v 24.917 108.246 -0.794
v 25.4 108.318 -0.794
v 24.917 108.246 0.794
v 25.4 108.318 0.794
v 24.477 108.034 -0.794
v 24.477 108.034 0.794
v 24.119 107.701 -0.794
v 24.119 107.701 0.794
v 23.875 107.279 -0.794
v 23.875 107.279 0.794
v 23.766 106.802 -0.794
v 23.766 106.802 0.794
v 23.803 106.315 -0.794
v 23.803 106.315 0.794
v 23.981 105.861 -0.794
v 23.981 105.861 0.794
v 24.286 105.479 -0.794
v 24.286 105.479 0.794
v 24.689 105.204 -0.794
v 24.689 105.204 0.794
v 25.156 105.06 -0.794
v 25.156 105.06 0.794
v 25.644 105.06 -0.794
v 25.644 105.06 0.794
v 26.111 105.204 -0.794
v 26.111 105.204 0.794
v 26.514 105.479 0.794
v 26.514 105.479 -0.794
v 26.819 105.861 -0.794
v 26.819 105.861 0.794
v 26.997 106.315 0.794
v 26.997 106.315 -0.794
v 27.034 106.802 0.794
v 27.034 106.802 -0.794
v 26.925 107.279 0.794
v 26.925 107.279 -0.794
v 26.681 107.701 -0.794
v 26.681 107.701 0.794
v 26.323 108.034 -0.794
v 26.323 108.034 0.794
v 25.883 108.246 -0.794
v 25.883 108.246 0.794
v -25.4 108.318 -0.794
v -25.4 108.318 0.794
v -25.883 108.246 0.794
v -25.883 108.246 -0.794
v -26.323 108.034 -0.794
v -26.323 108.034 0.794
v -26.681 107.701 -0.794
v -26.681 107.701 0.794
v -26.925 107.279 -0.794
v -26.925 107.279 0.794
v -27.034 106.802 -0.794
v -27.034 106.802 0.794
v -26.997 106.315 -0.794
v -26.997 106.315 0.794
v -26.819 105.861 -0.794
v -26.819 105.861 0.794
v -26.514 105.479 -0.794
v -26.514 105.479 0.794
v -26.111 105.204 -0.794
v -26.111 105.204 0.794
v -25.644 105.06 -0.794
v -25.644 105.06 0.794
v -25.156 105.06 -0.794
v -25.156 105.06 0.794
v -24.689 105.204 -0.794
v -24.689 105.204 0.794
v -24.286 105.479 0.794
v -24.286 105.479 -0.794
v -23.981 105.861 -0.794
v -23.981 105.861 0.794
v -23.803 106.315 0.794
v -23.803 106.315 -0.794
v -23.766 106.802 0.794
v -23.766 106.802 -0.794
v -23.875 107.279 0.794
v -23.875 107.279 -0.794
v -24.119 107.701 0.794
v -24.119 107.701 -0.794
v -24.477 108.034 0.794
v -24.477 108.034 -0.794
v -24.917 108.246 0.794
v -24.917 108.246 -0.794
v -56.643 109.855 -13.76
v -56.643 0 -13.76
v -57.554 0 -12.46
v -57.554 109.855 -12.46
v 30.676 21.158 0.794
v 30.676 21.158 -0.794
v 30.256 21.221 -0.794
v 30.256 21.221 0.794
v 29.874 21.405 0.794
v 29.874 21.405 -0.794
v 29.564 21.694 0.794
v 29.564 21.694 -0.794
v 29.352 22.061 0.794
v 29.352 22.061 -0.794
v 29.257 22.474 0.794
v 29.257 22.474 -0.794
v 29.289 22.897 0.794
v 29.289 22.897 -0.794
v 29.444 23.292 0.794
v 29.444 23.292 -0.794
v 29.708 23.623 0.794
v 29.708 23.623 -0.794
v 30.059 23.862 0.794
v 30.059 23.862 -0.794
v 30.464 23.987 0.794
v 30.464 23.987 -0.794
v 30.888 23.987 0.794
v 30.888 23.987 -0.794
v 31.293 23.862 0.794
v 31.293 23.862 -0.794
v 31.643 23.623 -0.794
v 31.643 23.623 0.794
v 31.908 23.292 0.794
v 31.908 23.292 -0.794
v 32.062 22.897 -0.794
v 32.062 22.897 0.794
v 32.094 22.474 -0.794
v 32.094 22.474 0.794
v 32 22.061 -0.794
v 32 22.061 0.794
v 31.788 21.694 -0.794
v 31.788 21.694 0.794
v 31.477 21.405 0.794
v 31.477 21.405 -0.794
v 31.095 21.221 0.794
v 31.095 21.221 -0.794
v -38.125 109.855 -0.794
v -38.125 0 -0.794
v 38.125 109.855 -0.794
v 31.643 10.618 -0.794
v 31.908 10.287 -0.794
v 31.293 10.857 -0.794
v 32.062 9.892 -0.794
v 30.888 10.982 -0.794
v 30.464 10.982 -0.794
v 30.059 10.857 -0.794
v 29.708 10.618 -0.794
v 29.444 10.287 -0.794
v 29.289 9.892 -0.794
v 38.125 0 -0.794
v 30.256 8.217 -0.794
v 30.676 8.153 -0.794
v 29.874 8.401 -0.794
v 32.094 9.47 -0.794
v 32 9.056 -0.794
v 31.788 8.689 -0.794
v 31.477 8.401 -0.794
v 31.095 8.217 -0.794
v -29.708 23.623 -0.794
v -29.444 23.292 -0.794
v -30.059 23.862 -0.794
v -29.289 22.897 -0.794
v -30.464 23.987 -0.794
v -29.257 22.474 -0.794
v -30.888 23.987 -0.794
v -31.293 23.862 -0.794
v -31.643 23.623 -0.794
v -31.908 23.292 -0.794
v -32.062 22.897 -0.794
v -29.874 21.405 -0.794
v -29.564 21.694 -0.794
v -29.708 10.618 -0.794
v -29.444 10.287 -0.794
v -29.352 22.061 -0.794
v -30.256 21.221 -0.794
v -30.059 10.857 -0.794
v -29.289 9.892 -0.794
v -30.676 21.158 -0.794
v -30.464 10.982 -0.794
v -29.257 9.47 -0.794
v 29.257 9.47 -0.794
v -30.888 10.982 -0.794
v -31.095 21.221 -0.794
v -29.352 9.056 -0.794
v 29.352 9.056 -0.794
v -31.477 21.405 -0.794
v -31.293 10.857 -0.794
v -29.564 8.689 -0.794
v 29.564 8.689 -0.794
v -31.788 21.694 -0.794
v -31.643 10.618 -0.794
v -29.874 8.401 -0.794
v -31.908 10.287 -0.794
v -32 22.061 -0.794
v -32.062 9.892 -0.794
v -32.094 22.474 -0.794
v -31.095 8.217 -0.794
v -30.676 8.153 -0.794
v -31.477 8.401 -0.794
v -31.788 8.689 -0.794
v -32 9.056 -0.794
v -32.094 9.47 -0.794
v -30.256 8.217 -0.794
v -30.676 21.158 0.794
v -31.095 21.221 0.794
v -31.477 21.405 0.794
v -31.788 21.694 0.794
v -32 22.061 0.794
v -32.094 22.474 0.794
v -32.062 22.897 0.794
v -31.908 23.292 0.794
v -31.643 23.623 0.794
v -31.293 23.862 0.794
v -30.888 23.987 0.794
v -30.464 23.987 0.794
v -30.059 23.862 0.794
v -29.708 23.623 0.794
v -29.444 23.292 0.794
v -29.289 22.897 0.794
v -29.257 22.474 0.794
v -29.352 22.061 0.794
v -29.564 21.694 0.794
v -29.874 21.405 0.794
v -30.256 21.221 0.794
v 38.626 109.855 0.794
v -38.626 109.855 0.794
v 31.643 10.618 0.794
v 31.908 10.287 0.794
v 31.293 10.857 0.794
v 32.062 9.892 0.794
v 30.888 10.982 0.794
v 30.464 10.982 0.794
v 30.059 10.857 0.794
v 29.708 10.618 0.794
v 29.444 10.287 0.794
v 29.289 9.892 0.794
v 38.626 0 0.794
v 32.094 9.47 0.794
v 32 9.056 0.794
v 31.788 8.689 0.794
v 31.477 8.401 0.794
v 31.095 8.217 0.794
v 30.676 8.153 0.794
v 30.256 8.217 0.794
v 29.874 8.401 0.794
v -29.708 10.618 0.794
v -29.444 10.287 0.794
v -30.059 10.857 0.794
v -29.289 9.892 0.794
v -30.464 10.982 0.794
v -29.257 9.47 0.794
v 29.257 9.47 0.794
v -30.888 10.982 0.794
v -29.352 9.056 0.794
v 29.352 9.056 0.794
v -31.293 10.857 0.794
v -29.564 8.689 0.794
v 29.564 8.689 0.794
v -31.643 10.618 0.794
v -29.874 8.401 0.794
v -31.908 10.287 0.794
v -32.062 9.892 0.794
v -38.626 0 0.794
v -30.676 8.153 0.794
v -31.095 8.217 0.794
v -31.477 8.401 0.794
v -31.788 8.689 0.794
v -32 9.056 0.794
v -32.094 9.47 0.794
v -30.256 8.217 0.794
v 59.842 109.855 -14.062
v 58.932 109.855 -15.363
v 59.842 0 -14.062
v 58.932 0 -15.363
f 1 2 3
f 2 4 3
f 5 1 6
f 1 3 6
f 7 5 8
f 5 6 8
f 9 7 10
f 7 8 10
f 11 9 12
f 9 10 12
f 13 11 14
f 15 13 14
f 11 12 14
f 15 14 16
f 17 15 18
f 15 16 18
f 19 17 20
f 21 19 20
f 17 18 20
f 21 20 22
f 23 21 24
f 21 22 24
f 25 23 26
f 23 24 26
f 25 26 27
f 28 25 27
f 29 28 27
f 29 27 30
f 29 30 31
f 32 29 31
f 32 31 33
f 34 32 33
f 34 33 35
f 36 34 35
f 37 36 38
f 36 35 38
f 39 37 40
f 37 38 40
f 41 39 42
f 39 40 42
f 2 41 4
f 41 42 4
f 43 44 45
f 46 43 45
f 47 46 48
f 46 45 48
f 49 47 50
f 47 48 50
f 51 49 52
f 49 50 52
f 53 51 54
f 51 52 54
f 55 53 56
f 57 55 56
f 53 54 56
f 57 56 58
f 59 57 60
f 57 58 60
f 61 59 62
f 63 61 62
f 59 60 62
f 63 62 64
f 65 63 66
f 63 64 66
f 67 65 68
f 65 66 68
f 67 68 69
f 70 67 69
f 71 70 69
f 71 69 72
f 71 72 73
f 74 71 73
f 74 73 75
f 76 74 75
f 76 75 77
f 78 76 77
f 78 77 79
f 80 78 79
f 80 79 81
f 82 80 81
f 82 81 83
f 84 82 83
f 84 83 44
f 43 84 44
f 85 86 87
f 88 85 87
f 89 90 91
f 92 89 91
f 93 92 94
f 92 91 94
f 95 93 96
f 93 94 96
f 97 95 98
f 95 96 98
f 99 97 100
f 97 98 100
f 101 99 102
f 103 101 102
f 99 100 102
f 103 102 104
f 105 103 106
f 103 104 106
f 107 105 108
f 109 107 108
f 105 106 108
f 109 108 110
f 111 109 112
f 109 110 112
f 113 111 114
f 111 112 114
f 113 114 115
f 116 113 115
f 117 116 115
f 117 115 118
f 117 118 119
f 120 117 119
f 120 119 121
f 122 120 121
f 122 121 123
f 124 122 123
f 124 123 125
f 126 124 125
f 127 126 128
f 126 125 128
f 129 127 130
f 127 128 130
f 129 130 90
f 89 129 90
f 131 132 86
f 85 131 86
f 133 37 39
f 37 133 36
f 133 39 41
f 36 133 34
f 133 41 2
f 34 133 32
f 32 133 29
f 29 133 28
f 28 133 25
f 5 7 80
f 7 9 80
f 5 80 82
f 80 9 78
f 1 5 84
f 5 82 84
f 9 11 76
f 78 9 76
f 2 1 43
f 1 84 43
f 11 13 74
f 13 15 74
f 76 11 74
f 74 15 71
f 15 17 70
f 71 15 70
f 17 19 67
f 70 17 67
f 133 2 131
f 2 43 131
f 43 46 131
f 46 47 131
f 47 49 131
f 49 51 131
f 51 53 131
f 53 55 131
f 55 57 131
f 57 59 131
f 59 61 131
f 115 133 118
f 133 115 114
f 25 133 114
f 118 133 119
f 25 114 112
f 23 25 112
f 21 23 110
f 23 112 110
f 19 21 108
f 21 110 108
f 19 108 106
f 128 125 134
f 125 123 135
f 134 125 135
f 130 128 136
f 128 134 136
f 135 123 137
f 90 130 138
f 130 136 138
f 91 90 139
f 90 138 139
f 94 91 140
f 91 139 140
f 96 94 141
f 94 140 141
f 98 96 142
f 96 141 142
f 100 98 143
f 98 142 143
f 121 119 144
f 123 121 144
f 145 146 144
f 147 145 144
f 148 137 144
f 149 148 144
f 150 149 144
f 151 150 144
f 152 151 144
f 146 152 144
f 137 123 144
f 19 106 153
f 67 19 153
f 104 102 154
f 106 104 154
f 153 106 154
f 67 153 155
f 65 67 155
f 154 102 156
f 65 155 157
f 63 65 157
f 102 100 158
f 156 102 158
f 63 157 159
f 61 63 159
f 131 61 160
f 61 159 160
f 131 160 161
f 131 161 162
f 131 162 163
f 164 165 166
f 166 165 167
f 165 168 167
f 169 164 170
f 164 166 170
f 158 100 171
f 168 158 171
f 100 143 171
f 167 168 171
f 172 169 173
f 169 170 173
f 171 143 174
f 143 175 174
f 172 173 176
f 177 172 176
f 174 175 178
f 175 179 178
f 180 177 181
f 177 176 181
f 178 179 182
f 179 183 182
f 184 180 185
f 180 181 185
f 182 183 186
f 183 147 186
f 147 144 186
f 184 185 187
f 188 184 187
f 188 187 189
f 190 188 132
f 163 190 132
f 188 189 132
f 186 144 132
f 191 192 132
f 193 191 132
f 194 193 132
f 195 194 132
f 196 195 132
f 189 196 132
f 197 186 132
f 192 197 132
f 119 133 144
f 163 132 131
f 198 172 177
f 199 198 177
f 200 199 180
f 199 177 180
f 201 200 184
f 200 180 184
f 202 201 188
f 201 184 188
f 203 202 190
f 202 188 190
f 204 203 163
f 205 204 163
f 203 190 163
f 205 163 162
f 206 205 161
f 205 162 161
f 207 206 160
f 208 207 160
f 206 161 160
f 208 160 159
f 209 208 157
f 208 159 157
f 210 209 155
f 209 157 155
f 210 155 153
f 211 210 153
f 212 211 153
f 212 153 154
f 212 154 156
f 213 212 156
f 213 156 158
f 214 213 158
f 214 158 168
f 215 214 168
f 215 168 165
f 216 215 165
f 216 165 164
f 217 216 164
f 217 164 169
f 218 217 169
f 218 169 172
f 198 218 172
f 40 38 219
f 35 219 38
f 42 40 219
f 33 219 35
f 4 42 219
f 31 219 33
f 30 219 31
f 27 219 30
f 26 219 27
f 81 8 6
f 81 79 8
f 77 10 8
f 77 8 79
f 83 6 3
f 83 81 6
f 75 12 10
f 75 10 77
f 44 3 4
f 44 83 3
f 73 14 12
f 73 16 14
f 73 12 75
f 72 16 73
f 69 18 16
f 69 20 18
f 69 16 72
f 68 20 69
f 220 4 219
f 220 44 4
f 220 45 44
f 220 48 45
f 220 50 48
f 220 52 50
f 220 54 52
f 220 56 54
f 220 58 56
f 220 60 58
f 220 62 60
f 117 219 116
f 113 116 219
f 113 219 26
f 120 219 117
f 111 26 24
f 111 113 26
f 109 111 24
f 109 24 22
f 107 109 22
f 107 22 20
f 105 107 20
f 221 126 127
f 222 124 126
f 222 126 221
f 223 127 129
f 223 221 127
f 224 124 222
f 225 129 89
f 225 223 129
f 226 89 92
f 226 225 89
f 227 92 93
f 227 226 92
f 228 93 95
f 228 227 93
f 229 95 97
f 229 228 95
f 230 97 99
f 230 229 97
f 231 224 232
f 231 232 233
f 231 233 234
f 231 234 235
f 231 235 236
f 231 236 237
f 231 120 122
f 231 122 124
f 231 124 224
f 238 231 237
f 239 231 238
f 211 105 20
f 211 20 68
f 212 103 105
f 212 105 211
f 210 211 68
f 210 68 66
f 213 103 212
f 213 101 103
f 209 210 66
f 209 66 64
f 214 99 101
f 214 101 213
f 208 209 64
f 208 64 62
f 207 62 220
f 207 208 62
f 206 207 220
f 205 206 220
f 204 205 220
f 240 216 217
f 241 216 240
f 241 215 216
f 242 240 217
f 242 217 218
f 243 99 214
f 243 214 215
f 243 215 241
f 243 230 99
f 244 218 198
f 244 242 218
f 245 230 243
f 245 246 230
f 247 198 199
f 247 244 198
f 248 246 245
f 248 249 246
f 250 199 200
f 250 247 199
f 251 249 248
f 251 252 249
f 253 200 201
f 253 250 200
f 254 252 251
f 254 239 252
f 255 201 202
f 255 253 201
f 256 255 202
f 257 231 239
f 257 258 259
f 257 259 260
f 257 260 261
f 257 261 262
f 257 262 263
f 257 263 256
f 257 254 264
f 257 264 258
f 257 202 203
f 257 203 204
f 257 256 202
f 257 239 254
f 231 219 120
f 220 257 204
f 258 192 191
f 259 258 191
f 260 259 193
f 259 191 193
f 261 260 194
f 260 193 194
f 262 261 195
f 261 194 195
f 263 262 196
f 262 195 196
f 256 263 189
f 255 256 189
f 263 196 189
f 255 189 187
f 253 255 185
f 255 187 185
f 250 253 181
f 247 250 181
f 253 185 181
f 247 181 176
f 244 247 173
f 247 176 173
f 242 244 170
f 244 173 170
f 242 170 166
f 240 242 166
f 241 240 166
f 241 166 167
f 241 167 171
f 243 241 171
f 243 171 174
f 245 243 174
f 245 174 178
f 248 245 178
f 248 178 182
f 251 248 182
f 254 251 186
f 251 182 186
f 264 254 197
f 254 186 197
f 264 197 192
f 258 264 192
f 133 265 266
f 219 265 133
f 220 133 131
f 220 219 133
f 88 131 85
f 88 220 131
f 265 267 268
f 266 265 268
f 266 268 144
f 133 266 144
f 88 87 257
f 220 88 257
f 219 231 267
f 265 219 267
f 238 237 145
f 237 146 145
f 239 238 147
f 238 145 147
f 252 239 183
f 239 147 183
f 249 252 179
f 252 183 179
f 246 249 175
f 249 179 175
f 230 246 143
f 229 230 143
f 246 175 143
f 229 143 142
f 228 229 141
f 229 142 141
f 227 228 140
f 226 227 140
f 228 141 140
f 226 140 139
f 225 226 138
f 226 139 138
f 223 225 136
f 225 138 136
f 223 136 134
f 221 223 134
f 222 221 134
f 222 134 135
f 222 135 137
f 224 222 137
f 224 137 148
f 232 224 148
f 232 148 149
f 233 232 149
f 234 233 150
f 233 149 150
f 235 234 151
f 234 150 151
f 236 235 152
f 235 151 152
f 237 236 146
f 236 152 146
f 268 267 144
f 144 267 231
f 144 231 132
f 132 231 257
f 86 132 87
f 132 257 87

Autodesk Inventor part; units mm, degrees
ref_plane "YZ Plane" through (0, 0, 0) normal (1, 0, 0) x (0, 1, 0)
ref_plane "XZ Plane" through (0, 0, 0) normal (0, 1, 0) x (-1, 0, 0)
ref_plane "XY Plane" through (0, 0, 0) normal (0, 0, 1) x (1, 0, 0)
sketch "Sketch1" plane through (0, 0, 0) normal (0, 1, 0) x (-1, 0, 0)
  line L0 (-38.6259, 0.7937) -> (38.6259, 0.7937)
  line L1 (-38.1254, -0.7938) -> (-38.6259, 0.7937) construction
  line L2 (-38.6259, 0.7937) -> (-59.8424, -14.0622)
  line L3 (-59.8424, -14.0622) -> (-58.9319, -15.3626)
  line L4 (-58.9319, -15.3626) -> (-38.1254, -0.7938)
  line L5 (-38.1254, -0.7938) -> (38.1254, -0.7938)
  line L6 (38.1254, -0.7938) -> (56.6432, -13.76)
  line L7 (56.6432, -13.76) -> (57.5537, -12.4596)
  line L8 (57.5537, -12.4596) -> (38.6259, 0.7937)
  point P0 (0, 0)
  dimension "d75" = 1.5875
  dimension "d76" = 1.5875
  dimension "d77" = 1.5875
  dimension "d78" = 145
  dimension "d79" = 76.2508
  dimension "d80" = 38.1254
  dimension "d81" = 0.7937
  dimension "d82" = 145
  dimension "d83" = 22.606
  dimension "d84" = 25.4
extrude "Extrusion1" add sketch "Sketch1" along normal blind 109.855
sketch "Sketch3" plane through (38.1254, 0, -0.7938) normal (0, 0, -1) x (-1, 0, 0)
  line L0 (38.1254, 97.0628) -> (38.1254, 73.759) construction
  line L1 (76.2508, 0) -> (76.2508, 109.855) construction
  line L2 (0, 0) -> (0, 109.855) construction
  line L3 (76.7513, 109.855) -> (-0.5005, 109.855) construction
  point P0 (38.1254, 0)
  point P1 (12.7254, 106.68)
  point P2 (63.5254, 106.68)
  dimension "d85" = 76.2508
  dimension "d86" = 38.1254
  dimension "d87" = 25.4
  dimension "d88" = 3.175
  dimension "d93" = 50.8
hole "Hole1" at (25.4, 106.68, -0.7938) at (-25.4, 106.68, -0.7938) direction (0, 0, 1) diameter 3.2766 end through all clearance for "Hex Machine Screw" size "#4" standard "Ansi Unified Screw Threads"
sketch "Sketch4" plane through (-38.6259, 0, 0.7937) normal (0, 0, 1) x (1, 0, 0)
  line L0 (0, 0) -> (0, 109.855) projected
  line L1 (77.2519, 0) -> (0, 0) projected
  line L2 (77.2519, 0) -> (77.2519, 109.855) projected
  point P0 (38.6259, 0)
  point P1 (69.3017, 9.5758)
  point P2 (7.9502, 22.5806)
  point P3 (7.9502, 9.5758)
  point P4 (69.3017, 22.5806)
  dimension "d112" = 7.9502
  dimension "d113" = 9.5758
  dimension "d114" = 9.5758
  dimension "d115" = 7.9502
  dimension "d116" = 7.9502
  dimension "d117" = 7.9502
  dimension "d118" = 22.5806
  dimension "d119" = 22.5806
hole "Hole3" at (30.6757, 9.5758, 0.7937) at (-30.6757, 22.5806, 0.7937) at (-30.6757, 9.5758, 0.7937) at (30.6757, 22.5806, 0.7937) direction (0, 0, -1) diameter 2.8448 end through all
equation "\"d75\" = d77"
equation "\"d76\" = d77"
equation "\"d80\" = 0.5 * d79"
equation "\"d81\" = 0.5 * d77"
equation "\"d86\" = 0.5 * d85"
equation "\"d87\" = 0.5 * d93"
equation "\"d114\" = d113"
equation "\"d116\" = d112"
equation "\"d117\" = d115"
equation "\"d119\" = d118"
properties part number "solar sheild" material "Aluminum 6061"
